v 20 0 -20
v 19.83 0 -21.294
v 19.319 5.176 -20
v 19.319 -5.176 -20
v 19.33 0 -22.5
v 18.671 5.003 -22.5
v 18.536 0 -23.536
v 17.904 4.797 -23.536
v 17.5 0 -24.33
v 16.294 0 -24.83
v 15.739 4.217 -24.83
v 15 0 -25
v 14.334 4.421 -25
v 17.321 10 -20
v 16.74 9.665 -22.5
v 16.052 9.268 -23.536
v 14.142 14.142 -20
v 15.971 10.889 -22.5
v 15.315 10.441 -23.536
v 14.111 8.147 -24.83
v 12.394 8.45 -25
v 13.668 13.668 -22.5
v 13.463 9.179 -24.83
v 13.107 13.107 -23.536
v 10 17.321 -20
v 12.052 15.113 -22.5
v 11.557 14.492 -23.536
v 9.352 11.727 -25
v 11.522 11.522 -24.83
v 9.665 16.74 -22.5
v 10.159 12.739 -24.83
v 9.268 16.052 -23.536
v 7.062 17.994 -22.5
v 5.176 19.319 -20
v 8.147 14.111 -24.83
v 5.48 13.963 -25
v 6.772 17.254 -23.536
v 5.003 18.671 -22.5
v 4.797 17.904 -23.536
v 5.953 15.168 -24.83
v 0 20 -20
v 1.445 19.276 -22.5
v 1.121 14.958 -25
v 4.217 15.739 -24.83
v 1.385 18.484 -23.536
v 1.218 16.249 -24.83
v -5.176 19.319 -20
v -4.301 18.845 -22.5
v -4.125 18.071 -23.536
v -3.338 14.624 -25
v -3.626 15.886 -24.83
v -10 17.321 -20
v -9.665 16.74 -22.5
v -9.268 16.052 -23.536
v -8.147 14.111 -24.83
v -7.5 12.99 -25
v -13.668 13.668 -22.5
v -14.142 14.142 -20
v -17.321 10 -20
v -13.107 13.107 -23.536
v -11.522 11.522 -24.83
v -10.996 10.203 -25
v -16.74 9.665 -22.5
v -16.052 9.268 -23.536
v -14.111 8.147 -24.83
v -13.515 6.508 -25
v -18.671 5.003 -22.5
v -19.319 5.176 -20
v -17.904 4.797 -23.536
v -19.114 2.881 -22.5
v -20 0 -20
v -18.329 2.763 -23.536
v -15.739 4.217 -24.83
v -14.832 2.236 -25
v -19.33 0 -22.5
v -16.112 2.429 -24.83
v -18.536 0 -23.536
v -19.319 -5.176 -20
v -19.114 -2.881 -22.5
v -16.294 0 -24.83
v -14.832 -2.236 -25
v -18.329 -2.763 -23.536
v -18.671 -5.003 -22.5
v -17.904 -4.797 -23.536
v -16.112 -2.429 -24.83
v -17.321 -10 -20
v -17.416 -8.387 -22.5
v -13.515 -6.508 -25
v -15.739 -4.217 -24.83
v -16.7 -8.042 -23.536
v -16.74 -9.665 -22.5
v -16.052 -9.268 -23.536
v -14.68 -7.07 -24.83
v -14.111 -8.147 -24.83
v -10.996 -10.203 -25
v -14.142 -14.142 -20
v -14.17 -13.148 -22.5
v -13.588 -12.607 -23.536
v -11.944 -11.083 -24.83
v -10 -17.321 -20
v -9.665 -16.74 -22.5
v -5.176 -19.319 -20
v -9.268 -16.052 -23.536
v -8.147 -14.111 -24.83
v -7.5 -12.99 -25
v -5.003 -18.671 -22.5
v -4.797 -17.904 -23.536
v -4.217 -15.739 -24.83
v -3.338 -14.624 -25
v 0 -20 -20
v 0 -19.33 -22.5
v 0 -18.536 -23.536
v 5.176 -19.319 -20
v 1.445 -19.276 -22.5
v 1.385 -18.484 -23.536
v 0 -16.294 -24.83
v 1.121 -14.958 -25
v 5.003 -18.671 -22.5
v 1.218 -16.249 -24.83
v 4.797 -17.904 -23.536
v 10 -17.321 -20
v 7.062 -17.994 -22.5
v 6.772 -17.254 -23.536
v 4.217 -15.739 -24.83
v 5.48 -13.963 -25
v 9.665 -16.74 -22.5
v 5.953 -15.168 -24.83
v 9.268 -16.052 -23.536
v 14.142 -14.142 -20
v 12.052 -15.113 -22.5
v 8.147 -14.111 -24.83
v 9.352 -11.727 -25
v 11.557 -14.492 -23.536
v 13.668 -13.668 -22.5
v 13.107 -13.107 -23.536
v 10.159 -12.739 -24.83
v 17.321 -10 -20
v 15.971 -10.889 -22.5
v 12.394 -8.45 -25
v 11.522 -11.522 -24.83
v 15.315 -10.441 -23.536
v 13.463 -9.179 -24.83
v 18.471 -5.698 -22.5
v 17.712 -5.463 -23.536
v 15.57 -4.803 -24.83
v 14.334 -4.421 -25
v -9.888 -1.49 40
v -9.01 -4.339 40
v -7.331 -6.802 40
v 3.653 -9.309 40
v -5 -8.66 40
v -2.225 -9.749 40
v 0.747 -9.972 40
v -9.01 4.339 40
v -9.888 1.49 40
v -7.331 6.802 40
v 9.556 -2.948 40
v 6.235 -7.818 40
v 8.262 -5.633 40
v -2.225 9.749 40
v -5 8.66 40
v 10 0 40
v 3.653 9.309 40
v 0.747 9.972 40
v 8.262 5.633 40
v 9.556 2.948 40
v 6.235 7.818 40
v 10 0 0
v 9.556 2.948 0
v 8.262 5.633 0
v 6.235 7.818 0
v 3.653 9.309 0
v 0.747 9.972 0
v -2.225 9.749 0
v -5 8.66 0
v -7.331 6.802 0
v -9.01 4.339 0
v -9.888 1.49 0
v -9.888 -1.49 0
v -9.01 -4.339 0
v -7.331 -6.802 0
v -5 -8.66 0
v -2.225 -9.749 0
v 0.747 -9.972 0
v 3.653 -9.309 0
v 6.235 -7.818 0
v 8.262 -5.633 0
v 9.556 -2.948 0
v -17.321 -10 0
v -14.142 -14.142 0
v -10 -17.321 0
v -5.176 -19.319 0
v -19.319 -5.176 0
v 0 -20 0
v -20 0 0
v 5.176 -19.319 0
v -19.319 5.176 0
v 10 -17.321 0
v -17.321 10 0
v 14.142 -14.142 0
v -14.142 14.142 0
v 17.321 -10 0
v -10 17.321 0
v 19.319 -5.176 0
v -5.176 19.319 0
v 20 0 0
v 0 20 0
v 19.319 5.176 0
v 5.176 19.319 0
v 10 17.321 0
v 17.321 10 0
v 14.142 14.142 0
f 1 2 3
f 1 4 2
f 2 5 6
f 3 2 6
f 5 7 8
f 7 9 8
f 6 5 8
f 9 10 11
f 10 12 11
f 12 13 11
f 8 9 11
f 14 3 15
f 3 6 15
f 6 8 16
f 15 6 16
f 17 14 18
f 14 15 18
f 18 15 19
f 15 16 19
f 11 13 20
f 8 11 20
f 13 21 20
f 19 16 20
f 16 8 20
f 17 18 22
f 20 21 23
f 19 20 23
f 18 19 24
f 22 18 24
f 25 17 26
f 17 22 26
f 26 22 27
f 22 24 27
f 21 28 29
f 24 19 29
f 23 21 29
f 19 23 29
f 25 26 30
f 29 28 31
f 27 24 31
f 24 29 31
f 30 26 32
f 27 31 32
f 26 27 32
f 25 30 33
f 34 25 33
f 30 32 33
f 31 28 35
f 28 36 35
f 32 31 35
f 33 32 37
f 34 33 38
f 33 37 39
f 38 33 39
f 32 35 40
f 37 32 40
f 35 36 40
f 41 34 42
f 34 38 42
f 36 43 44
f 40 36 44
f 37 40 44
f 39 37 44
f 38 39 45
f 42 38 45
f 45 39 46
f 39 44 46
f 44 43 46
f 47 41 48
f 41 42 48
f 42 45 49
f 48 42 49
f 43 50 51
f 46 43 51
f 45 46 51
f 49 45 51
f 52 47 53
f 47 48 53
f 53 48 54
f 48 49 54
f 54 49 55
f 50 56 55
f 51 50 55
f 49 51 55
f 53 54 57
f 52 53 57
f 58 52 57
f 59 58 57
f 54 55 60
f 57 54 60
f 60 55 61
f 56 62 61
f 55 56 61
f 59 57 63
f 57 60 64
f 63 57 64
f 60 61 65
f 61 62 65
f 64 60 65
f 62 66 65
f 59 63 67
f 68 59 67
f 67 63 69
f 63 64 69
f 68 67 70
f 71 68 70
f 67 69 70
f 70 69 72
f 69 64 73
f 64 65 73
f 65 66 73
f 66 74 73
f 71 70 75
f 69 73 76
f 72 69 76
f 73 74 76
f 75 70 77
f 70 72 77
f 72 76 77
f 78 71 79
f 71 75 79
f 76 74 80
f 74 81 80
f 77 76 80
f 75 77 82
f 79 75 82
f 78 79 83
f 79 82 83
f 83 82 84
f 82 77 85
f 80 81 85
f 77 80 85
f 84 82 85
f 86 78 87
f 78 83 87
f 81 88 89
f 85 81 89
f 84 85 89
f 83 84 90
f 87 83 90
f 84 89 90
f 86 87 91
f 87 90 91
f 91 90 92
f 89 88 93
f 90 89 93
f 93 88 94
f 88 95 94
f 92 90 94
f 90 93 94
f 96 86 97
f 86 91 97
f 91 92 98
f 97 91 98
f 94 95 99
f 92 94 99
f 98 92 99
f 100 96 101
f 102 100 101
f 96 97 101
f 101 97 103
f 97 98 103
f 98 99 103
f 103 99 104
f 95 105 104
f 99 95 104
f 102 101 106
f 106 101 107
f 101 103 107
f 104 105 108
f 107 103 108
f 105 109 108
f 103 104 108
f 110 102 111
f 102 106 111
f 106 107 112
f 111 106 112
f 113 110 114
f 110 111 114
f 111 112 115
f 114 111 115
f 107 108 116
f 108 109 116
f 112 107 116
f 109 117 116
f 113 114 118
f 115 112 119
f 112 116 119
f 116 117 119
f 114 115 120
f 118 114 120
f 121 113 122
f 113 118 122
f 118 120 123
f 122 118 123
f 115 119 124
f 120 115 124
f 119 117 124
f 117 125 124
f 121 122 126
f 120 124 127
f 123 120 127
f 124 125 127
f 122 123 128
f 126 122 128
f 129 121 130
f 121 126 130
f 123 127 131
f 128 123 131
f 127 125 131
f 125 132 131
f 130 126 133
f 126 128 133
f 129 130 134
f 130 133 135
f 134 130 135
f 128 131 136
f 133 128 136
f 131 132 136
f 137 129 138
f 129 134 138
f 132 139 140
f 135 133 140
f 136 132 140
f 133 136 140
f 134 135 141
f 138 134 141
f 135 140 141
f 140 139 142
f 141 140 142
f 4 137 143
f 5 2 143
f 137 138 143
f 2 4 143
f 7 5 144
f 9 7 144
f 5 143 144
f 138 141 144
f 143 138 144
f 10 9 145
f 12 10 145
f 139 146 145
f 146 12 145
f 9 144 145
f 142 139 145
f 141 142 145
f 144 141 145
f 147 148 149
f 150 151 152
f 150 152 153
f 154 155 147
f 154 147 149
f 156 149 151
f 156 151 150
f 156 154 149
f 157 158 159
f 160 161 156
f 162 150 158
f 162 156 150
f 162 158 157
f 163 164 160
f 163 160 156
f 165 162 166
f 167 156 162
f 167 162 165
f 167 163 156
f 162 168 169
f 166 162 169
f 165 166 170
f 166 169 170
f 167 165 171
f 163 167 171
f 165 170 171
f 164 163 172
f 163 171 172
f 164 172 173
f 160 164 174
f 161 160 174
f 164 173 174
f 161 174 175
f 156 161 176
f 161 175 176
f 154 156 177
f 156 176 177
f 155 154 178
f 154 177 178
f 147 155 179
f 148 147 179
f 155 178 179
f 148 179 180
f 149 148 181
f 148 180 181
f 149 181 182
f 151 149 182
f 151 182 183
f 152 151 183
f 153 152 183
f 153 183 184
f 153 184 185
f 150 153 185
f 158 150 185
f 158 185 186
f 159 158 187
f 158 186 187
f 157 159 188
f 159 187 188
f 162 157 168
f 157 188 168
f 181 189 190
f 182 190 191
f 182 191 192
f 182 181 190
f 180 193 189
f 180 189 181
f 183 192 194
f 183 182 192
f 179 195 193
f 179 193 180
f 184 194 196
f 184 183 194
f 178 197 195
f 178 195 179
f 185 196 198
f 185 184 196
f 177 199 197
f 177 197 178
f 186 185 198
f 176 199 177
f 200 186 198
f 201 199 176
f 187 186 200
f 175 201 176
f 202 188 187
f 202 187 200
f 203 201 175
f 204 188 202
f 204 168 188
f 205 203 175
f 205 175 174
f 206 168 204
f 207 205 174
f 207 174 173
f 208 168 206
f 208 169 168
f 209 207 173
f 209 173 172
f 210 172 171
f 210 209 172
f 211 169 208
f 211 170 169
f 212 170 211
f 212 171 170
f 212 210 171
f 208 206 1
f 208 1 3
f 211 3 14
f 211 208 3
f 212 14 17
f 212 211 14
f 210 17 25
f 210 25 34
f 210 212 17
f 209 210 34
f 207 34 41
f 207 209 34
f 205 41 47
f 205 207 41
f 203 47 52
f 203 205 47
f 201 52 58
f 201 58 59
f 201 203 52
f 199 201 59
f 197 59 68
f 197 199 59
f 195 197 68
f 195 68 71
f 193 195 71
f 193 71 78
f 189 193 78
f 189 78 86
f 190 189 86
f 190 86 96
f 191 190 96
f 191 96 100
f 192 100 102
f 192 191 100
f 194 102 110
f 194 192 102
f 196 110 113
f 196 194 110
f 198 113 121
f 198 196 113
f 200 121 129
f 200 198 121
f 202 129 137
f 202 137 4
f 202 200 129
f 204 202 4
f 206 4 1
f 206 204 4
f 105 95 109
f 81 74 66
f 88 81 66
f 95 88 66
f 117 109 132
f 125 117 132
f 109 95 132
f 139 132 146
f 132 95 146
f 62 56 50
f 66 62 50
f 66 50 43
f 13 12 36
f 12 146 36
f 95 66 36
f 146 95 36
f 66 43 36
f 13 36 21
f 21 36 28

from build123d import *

# Parameters (mm, degrees)
F0_R     = 20
F1_DEPTH = 25
F2_R     = 10
F3_DEPTH = 40
F4_R     = 5


with BuildPart() as f1:
    # F0 (on Top) → F1 (new body)
    with BuildSketch(Plane.XY):
        Circle(F0_R)
    extrude(amount=-F1_DEPTH)

    # F2 (on Top) → F3 (join)
    with BuildSketch(Plane.XY):
        Circle(F2_R)
    extrude(amount=F3_DEPTH)

    # F4
    f4_edges = [f1.edges().sort_by_distance(p)[0] for p in [
        (-20, 0, -25),
    ]]
    fillet(f4_edges, radius=F4_R)


solid = f1.part
